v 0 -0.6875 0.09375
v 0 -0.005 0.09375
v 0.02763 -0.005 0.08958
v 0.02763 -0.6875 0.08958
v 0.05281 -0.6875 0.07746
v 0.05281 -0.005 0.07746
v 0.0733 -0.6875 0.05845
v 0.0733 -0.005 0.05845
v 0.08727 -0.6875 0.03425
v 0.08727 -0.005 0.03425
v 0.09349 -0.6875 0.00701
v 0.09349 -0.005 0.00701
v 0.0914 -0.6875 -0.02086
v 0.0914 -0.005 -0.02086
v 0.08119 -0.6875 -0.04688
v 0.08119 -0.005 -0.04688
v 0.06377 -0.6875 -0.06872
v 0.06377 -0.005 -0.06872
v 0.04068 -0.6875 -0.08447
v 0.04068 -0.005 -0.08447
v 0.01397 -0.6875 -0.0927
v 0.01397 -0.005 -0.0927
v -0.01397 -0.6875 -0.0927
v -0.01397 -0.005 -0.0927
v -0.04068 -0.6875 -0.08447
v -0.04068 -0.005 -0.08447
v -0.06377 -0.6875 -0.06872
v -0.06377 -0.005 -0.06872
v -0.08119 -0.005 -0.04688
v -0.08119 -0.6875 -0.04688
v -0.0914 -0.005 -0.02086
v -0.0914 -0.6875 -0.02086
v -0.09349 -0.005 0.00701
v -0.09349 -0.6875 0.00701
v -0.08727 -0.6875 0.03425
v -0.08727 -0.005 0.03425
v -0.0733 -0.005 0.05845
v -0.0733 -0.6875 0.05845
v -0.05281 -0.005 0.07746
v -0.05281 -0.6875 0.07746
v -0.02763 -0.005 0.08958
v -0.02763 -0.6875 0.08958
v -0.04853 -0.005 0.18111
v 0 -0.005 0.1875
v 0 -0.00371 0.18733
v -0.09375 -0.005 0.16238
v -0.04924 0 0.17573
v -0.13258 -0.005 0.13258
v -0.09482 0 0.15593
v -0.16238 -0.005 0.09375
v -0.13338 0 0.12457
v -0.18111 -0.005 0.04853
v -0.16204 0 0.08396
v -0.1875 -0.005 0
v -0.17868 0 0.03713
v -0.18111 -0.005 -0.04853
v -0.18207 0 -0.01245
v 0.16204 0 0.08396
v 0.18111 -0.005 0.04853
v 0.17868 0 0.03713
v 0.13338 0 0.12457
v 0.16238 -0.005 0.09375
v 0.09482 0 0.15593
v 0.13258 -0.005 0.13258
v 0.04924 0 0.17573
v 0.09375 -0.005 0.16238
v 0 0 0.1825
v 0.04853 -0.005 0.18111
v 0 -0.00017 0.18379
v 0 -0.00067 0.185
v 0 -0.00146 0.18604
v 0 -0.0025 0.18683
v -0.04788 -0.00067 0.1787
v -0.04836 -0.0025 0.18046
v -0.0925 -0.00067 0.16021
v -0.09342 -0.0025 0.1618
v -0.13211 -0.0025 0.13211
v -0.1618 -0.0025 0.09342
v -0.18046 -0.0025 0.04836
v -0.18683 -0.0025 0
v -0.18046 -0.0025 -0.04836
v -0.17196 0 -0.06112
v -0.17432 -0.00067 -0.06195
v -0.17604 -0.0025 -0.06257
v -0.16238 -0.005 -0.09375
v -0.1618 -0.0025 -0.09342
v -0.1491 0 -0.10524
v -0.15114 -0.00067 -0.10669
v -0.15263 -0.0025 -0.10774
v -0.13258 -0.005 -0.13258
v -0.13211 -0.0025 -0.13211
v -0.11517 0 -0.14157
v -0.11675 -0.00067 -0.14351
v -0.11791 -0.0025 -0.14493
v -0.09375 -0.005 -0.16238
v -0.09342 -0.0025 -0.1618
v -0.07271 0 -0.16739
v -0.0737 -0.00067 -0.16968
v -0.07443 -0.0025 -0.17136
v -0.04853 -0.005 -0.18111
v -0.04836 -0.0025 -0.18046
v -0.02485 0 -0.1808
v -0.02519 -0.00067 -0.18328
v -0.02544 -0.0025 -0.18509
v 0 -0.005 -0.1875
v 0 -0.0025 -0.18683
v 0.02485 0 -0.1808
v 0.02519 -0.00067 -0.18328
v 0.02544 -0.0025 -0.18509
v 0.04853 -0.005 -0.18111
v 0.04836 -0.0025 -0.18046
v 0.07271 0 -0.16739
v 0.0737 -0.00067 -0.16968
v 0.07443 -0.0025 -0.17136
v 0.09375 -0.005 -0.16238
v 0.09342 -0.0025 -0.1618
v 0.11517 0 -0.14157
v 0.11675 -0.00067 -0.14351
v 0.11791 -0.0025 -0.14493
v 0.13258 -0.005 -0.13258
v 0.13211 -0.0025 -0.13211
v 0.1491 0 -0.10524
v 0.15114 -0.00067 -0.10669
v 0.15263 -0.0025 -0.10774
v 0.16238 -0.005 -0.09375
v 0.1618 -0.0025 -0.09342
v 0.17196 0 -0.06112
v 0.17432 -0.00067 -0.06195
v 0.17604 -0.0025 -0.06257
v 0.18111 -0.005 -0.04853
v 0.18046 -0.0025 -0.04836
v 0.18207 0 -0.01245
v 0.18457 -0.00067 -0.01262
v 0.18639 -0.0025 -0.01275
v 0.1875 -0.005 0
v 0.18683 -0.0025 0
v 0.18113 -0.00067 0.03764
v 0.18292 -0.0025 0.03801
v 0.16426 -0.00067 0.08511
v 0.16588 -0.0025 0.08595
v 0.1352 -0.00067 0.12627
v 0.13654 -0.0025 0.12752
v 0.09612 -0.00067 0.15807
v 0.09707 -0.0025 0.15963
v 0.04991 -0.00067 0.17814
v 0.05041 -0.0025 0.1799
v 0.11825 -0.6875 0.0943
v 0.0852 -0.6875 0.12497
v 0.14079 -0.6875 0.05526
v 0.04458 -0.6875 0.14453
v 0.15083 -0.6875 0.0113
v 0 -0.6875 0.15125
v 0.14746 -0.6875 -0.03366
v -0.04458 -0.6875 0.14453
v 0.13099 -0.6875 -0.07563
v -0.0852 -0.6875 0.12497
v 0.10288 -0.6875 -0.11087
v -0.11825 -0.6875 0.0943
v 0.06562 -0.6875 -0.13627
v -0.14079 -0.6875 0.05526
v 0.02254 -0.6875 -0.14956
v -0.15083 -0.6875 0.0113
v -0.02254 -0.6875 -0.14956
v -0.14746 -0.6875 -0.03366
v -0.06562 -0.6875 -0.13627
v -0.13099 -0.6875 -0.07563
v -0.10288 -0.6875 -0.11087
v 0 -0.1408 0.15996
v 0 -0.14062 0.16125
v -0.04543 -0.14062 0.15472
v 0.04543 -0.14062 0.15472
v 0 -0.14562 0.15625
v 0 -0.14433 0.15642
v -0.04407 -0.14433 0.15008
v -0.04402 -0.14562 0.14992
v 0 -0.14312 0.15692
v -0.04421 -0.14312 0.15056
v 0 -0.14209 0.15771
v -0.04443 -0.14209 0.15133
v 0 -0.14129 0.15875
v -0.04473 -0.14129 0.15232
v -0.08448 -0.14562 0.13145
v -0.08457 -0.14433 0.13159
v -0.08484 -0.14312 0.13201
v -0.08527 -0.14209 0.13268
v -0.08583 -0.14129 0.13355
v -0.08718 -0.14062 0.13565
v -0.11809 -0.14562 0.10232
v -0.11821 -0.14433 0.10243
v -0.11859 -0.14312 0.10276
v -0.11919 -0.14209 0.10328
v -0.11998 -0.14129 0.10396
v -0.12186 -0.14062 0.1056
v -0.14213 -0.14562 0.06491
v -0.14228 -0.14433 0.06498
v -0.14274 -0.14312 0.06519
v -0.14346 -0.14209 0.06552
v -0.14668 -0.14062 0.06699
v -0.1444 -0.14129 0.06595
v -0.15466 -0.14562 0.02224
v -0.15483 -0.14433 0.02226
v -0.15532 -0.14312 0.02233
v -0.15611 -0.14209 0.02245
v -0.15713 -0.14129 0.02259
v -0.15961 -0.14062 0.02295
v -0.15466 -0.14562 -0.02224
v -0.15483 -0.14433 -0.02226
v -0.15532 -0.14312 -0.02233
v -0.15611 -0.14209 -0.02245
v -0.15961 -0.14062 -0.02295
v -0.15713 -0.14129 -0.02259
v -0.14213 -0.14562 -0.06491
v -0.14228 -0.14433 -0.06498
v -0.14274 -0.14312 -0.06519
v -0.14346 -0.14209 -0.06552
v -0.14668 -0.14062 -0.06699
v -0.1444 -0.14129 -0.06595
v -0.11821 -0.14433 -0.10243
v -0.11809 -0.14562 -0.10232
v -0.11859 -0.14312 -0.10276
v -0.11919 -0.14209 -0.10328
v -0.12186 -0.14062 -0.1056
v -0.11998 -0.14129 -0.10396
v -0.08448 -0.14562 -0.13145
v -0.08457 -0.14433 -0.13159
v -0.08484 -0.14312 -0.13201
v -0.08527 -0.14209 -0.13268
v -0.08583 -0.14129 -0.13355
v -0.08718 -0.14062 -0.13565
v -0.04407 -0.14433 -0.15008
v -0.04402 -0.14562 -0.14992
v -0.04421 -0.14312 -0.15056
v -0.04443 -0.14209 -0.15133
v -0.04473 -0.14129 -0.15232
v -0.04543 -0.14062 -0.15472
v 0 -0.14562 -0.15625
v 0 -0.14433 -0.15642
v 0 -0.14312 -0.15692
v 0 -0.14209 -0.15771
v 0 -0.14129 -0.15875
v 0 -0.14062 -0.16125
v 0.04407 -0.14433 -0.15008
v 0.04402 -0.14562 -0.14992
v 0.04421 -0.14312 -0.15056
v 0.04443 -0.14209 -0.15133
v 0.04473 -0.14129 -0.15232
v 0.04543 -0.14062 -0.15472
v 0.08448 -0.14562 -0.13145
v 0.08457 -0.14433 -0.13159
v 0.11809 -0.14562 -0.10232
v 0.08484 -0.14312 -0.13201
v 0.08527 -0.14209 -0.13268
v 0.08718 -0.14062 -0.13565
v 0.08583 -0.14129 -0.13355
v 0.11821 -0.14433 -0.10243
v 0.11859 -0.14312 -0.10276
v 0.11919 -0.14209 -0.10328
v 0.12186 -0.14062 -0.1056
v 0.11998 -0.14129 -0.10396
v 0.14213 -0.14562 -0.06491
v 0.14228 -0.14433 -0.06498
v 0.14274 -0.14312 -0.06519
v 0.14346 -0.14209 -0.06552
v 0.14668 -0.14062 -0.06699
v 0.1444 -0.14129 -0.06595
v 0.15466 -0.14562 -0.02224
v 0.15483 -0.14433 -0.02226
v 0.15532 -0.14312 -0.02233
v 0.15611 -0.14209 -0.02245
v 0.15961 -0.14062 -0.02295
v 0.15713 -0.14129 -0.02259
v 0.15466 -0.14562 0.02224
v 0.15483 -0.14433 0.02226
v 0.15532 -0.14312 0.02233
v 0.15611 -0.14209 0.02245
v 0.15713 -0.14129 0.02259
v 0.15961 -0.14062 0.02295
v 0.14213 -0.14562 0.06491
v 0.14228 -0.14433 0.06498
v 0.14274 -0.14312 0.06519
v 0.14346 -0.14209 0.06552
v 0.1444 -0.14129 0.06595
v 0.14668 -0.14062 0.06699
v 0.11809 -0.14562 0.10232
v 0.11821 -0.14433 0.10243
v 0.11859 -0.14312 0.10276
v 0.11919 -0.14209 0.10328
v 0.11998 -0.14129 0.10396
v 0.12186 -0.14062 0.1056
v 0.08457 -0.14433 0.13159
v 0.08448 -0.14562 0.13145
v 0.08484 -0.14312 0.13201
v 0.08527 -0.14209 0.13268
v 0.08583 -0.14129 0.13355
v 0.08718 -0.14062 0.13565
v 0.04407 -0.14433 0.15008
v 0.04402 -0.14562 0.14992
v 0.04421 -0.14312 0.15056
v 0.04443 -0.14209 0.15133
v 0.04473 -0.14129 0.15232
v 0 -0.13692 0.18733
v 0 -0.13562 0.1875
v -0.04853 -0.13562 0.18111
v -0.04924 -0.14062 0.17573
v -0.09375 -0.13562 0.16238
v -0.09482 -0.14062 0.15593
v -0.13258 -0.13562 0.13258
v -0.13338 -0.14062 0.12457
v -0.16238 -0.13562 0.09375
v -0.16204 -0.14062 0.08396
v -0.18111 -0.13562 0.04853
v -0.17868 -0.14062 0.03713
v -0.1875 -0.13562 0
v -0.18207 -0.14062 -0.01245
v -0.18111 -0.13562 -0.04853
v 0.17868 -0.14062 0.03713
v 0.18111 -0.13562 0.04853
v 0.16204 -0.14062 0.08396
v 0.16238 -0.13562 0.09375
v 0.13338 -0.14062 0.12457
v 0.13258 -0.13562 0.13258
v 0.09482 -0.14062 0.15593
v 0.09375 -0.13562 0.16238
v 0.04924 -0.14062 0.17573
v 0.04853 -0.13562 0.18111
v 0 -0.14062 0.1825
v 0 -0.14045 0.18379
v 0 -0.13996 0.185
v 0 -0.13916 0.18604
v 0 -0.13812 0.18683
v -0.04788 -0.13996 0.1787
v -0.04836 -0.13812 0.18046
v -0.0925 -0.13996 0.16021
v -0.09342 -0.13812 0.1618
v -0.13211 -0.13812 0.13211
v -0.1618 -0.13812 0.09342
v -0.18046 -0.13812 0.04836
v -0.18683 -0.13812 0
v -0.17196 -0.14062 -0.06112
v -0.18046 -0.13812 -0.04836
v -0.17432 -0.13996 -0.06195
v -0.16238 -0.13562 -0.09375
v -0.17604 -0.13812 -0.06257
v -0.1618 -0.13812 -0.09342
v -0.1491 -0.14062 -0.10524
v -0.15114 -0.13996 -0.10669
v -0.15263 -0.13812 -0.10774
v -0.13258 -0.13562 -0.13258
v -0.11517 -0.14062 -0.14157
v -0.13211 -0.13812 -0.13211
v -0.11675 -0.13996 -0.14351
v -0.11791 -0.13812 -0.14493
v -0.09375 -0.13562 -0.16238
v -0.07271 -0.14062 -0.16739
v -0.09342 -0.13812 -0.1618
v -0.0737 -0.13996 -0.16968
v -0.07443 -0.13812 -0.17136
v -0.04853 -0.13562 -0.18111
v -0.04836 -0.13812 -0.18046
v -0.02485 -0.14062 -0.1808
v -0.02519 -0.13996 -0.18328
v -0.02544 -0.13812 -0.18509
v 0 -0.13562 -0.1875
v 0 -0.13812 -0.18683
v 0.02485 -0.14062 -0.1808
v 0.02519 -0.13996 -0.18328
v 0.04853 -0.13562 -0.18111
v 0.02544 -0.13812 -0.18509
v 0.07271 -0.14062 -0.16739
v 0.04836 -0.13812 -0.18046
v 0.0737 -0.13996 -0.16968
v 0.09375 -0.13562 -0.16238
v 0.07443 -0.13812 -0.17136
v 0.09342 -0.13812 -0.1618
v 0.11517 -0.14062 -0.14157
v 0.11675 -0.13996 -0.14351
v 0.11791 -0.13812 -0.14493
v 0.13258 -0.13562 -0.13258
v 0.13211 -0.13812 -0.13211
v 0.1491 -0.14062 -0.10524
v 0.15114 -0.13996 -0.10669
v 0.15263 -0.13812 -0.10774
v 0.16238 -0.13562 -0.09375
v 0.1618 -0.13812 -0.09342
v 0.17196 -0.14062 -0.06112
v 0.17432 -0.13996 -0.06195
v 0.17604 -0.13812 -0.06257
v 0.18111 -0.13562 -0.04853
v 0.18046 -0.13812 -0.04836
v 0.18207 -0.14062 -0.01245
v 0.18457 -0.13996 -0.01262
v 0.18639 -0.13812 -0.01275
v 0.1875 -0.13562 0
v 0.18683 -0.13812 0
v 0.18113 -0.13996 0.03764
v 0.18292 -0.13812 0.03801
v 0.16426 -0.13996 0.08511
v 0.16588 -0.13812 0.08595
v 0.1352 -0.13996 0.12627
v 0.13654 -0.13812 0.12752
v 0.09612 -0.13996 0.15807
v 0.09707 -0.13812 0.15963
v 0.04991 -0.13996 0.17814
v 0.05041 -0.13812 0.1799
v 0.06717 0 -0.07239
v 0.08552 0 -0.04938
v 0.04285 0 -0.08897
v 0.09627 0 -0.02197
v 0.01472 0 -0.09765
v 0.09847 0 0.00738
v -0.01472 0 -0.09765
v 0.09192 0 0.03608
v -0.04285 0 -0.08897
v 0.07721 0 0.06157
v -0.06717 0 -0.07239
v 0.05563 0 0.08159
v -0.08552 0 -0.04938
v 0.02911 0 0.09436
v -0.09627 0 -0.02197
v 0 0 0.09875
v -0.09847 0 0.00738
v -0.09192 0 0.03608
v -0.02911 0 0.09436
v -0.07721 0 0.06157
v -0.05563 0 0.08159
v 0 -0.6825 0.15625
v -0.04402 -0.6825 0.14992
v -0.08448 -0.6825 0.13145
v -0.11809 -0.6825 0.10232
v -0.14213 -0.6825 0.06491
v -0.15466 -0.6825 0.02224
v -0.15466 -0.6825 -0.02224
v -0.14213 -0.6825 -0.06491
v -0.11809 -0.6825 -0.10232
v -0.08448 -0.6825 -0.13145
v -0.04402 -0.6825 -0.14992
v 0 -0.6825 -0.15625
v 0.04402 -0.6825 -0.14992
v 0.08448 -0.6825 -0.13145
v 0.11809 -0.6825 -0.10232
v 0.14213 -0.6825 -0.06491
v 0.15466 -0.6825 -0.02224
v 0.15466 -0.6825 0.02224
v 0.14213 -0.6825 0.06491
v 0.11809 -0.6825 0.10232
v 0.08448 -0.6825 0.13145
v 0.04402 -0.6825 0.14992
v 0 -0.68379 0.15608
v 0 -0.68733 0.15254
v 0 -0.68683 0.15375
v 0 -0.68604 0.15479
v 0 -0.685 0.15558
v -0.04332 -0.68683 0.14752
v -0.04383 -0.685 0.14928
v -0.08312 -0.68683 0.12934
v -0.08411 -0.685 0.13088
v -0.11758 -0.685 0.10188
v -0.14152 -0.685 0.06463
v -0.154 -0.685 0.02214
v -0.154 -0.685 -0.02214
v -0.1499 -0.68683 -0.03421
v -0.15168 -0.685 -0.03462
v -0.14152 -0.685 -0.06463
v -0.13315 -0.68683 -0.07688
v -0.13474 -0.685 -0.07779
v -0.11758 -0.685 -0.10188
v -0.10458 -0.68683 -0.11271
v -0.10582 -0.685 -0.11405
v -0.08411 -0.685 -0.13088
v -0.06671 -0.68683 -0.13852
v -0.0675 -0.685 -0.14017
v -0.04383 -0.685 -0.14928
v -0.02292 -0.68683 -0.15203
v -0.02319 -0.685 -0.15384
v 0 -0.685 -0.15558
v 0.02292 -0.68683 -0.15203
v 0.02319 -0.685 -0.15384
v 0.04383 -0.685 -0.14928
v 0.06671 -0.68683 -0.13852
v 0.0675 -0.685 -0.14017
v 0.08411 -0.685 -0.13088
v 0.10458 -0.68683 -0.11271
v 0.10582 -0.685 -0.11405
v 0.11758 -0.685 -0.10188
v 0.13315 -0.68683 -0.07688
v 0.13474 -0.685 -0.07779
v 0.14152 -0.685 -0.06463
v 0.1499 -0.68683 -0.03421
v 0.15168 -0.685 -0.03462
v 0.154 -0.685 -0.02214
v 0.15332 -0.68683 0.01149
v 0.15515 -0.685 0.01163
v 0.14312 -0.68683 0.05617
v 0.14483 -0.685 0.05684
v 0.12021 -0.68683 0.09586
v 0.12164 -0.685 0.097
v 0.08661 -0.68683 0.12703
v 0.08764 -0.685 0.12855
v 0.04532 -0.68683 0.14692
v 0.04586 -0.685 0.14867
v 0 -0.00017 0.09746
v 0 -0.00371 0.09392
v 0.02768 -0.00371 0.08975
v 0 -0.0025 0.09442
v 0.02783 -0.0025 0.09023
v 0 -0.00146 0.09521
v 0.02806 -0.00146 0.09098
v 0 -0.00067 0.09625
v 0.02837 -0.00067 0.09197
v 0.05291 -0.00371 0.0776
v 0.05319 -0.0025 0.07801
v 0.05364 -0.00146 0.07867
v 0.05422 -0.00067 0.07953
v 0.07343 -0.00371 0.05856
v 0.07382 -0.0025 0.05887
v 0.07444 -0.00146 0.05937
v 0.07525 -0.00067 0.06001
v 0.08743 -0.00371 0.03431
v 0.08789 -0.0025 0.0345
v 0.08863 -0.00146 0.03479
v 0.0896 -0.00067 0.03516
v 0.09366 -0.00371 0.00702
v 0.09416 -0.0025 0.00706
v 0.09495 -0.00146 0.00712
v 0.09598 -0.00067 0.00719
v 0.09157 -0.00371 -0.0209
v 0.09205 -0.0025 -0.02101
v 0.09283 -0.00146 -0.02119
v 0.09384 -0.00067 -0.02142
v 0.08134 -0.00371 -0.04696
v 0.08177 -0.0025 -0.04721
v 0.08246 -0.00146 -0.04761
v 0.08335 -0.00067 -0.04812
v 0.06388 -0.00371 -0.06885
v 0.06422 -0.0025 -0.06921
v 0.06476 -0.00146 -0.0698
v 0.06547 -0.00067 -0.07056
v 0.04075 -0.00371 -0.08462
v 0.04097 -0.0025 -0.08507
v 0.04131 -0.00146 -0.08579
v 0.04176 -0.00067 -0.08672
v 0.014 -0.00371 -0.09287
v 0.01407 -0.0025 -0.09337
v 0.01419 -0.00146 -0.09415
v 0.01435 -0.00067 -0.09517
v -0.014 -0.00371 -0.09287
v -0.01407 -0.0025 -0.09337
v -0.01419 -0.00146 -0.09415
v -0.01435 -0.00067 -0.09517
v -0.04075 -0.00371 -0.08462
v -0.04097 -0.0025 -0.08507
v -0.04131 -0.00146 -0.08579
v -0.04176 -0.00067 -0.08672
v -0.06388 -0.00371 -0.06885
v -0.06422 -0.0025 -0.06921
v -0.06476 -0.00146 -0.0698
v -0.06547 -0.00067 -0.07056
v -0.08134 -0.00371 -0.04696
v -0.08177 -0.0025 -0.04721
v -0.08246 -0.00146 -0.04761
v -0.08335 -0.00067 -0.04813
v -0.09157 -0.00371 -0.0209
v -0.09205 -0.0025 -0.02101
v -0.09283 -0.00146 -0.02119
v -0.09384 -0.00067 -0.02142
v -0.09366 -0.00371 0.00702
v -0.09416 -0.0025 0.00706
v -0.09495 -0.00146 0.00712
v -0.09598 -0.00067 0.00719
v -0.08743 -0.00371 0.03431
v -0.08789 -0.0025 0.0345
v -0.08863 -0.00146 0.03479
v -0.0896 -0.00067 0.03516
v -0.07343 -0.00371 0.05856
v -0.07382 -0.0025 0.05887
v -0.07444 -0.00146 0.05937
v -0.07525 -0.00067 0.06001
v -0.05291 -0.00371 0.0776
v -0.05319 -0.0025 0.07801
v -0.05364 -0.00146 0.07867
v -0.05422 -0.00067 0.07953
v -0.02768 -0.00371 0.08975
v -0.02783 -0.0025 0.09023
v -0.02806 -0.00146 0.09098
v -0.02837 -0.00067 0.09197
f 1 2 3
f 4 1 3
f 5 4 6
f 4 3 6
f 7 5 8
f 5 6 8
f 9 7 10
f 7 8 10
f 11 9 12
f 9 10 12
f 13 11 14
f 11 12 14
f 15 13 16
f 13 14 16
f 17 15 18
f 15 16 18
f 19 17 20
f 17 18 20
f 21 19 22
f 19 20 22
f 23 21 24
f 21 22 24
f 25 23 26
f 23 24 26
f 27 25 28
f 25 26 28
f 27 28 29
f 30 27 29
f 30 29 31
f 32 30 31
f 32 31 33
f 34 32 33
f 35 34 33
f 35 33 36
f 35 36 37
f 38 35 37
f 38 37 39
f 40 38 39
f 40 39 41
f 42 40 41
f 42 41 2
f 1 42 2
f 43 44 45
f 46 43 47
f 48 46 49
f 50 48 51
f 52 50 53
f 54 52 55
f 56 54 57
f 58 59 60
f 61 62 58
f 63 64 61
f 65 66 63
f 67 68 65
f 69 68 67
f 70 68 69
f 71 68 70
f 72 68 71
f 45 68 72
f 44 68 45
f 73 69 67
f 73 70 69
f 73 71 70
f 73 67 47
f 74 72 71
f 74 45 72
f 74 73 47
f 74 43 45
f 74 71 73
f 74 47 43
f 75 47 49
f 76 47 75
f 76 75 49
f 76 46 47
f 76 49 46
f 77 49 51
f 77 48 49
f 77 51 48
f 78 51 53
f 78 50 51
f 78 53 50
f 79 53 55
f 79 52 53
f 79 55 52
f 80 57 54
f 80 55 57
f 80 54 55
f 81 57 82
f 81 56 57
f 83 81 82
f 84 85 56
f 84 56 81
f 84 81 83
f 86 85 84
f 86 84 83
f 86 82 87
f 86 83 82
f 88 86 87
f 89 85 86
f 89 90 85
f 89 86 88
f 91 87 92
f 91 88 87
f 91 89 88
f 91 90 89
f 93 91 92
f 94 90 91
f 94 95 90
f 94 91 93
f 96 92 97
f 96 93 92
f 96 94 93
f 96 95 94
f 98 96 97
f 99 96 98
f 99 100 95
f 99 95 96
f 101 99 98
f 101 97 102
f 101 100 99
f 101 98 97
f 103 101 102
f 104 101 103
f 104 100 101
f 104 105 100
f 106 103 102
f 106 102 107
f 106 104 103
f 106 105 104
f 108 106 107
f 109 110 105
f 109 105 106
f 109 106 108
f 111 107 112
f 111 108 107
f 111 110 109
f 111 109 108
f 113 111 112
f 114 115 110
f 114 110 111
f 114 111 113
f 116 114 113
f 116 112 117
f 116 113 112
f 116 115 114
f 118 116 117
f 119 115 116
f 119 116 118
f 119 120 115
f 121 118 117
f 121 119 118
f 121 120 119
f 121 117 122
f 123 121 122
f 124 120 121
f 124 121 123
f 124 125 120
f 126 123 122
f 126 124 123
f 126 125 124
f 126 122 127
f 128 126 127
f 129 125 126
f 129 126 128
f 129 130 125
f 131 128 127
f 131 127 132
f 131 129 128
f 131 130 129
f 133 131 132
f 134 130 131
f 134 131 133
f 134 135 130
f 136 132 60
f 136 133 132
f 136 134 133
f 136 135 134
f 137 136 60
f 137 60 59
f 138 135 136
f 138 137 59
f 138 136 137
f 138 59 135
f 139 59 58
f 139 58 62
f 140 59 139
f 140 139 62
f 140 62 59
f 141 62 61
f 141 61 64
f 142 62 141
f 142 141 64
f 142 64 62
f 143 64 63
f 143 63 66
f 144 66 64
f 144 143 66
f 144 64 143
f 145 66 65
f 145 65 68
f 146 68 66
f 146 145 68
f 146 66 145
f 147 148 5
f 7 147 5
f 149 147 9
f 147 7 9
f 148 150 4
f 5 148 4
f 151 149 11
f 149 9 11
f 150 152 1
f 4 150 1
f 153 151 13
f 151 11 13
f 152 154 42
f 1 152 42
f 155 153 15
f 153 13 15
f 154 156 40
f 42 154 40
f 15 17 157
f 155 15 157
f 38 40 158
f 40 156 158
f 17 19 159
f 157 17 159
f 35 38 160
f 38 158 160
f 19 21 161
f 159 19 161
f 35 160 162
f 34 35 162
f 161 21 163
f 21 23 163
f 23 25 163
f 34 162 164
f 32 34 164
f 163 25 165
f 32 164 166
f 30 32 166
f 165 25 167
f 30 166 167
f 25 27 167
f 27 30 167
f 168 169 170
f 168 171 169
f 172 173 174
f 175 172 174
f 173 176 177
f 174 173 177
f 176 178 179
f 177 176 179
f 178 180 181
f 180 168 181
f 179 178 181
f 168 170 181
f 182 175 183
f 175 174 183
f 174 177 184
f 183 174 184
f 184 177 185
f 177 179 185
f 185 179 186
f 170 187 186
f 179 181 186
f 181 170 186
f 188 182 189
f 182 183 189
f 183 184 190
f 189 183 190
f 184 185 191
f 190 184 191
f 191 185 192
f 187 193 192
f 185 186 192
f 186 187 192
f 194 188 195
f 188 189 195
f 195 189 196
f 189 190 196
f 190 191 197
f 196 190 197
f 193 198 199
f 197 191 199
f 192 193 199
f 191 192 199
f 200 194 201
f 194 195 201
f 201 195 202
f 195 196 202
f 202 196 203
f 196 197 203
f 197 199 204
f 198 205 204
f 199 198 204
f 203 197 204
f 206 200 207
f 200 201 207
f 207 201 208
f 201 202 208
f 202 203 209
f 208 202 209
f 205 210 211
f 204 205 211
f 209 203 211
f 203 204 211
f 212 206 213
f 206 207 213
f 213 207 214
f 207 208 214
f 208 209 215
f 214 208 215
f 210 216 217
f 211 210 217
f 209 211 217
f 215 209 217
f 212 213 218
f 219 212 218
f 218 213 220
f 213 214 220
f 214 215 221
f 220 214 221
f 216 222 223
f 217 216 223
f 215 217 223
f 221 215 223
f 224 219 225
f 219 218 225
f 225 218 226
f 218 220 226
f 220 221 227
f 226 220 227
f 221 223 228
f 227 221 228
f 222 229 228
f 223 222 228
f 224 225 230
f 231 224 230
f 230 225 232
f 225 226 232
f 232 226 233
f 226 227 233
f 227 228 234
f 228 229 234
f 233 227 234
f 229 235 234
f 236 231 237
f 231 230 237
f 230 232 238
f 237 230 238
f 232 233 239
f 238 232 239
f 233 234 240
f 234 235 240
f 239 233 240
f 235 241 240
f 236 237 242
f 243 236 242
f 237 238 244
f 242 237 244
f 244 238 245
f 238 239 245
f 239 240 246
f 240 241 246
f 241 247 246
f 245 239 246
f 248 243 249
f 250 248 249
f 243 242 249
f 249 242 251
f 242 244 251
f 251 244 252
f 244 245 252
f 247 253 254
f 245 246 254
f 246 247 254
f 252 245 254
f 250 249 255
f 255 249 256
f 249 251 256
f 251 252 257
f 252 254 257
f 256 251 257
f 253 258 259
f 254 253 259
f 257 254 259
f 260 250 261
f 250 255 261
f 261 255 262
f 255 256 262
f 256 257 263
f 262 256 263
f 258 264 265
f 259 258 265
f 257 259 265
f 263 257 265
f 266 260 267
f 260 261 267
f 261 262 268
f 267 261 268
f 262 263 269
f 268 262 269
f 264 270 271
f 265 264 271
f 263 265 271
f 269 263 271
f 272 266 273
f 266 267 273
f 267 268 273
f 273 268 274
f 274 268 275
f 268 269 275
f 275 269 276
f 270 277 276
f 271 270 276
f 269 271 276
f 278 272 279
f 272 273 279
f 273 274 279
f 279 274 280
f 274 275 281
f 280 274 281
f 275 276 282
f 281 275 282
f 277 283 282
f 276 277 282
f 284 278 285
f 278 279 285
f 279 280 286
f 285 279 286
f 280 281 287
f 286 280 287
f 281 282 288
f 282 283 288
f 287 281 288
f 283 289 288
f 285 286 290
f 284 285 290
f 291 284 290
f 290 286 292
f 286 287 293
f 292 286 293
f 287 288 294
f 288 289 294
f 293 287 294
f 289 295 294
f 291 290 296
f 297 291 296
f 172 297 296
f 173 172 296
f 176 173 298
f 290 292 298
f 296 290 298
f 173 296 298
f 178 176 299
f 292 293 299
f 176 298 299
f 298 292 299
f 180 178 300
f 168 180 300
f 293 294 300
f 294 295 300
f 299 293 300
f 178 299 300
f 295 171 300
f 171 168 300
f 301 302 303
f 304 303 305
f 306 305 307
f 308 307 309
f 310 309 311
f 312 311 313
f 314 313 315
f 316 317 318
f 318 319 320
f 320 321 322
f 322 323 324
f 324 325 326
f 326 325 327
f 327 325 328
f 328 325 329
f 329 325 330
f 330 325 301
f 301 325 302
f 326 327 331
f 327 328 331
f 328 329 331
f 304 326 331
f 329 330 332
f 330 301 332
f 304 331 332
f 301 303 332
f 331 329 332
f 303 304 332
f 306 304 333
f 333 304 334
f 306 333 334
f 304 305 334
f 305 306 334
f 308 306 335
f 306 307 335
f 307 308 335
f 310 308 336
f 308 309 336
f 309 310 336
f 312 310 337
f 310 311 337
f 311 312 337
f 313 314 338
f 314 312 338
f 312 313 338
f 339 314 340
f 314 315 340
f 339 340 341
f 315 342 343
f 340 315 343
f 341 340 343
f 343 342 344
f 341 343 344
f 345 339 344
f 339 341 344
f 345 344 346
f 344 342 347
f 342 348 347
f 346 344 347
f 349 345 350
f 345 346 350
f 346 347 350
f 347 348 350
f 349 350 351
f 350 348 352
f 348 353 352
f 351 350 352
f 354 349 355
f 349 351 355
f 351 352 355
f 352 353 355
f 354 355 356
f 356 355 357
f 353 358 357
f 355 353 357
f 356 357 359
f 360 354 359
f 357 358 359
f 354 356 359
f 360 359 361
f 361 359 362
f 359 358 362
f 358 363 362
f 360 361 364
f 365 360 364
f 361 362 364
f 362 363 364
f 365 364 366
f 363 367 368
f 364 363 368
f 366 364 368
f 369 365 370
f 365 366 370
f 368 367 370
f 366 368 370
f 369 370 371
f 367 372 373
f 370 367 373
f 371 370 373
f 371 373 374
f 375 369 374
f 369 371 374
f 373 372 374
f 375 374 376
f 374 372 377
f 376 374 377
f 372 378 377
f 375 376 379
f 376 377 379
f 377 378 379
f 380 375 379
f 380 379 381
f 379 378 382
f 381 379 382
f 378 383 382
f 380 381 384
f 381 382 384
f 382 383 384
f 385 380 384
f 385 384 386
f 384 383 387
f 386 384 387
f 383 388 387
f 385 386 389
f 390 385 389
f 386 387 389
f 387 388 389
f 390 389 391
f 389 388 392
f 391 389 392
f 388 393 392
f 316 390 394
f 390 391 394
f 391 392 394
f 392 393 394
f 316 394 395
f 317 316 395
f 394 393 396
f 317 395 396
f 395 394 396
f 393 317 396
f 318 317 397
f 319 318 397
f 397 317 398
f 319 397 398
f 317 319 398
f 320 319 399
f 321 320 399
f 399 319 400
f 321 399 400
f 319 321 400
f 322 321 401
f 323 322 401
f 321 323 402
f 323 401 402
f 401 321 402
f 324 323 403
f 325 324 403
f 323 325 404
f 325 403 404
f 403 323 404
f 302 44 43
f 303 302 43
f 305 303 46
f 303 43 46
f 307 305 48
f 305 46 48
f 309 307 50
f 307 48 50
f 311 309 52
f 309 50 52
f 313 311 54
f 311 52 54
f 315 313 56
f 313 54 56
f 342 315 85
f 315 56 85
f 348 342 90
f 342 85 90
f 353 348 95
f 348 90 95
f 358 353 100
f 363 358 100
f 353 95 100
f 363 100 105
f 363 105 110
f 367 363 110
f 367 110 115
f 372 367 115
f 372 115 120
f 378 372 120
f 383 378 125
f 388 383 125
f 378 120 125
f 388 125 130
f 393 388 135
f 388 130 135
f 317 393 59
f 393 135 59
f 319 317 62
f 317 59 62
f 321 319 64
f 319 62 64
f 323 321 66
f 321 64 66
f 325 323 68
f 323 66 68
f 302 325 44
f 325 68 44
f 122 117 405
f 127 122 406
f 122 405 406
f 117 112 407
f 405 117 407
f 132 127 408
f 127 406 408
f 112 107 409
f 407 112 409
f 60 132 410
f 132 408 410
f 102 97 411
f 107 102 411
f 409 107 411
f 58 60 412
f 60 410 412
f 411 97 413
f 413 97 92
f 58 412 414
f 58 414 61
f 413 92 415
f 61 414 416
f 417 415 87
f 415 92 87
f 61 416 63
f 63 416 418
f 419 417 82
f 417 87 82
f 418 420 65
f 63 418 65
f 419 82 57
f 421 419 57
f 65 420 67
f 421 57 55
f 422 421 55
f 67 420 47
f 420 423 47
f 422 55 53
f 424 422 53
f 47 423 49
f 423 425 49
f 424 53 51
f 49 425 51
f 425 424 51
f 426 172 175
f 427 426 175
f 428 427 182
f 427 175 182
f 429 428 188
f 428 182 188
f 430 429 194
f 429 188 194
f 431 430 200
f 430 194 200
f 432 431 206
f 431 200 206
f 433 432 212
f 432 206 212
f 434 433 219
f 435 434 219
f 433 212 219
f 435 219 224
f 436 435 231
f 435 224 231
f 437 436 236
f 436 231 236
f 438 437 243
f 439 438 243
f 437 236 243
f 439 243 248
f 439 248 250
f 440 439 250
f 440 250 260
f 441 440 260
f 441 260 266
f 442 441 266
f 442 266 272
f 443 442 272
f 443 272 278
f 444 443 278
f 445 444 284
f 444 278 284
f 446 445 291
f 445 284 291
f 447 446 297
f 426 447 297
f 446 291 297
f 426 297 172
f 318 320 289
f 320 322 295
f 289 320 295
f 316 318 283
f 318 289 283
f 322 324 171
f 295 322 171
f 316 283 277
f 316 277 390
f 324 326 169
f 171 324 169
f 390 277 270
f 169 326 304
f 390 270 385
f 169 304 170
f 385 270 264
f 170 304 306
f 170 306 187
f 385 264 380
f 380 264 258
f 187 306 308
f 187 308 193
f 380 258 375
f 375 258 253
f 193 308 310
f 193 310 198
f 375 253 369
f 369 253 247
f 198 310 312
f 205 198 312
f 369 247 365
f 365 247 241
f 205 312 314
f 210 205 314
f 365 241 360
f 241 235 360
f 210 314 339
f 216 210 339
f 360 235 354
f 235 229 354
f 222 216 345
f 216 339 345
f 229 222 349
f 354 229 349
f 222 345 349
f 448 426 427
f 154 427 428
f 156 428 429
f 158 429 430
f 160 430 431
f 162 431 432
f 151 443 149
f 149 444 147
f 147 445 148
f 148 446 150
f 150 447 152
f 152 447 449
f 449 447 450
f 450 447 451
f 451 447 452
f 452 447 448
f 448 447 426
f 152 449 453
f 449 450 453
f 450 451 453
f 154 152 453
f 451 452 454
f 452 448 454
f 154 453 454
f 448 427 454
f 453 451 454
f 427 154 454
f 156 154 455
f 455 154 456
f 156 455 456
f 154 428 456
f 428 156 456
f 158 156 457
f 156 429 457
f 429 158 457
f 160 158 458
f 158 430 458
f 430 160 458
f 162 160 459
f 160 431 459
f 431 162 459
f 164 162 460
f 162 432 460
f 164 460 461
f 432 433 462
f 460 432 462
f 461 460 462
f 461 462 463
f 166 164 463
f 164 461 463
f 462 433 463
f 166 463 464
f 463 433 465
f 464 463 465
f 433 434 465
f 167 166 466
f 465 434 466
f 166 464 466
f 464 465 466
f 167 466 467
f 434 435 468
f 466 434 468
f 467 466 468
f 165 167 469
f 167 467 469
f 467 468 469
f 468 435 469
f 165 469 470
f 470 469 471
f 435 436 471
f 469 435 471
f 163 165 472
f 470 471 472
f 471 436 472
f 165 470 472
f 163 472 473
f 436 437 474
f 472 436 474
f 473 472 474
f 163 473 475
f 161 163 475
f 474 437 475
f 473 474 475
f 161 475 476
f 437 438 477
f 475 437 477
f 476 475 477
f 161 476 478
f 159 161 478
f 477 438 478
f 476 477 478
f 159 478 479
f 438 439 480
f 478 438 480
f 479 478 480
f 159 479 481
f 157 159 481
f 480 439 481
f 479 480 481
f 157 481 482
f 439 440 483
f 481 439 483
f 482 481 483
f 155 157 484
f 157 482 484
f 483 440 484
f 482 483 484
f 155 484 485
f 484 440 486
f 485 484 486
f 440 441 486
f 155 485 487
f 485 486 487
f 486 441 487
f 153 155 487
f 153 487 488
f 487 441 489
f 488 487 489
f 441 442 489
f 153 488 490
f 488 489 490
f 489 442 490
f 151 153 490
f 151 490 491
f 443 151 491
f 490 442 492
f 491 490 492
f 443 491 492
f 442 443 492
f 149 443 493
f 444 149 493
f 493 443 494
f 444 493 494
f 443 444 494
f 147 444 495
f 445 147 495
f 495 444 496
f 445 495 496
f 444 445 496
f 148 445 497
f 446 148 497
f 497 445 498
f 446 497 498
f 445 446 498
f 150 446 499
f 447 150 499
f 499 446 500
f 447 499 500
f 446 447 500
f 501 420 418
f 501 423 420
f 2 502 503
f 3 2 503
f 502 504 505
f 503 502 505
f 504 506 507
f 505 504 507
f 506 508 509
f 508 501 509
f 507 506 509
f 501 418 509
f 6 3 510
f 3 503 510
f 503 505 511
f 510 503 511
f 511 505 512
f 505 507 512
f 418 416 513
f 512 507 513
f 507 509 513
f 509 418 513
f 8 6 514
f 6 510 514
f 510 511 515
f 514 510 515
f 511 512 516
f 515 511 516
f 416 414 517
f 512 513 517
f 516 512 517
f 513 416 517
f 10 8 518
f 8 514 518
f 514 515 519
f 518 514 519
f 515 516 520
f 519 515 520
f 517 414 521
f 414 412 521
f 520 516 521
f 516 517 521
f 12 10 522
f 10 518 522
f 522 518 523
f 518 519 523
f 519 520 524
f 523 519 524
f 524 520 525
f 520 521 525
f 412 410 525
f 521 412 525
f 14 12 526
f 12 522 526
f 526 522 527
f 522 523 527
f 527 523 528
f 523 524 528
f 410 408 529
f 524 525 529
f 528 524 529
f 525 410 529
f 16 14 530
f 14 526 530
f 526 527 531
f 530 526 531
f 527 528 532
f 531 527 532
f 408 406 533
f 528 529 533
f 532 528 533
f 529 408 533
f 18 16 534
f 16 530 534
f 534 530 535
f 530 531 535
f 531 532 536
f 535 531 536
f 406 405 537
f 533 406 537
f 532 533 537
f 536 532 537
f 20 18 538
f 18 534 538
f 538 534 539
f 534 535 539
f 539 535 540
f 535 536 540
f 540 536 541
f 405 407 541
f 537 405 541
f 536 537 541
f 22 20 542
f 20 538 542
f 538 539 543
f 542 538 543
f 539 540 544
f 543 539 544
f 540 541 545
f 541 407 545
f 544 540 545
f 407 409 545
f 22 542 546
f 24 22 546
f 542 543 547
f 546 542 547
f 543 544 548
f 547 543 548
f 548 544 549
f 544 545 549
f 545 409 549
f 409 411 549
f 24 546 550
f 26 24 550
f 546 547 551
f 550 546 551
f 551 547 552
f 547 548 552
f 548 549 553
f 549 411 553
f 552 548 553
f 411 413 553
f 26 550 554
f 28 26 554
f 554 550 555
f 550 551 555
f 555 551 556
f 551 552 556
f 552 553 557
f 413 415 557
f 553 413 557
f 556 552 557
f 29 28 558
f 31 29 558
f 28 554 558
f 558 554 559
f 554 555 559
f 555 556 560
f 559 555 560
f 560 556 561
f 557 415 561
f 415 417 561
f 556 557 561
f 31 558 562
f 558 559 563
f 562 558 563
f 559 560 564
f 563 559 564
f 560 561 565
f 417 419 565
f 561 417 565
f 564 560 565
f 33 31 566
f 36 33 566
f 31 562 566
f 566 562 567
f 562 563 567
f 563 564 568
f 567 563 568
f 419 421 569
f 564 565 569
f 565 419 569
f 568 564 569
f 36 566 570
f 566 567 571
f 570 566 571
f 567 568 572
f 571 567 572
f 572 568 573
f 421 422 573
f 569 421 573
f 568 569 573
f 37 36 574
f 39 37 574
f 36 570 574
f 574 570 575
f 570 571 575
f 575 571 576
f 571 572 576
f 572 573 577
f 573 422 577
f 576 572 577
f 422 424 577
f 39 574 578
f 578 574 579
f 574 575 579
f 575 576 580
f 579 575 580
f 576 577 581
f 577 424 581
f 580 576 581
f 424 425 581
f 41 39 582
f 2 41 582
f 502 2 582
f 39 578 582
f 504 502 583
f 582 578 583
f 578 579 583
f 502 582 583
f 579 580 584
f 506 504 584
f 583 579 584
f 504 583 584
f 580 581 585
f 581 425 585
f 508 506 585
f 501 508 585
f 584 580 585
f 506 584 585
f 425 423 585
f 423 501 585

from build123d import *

# Parameters (mm, degrees)
SKETCH2_R          = 0.09375
CUT_EXTRUDE1_DEPTH = 1.736864133
FILLET1_R          = 0.005


with BuildPart() as part:
    # Sketch1 → Revolve1 (revolve)
    with BuildSketch(Plane.XY, mode=Mode.PRIVATE) as revolve1_sk:
        Polygon((0, -0.6875), (0.15625, -0.6875), (0.15625, -0.140625), (0.1875, -0.140625), (0.1875, 0), (0, 0), align=None)
    revolve(revolve1_sk.sketch.rotate(Axis((0, 0, 0), (0, -1, 0)), 90), axis=Axis((0, 0, 0), (0, -1, 0)))

    # Sketch2 → Cut-Extrude1 (cut, through all)
    with BuildSketch(Plane(origin=(0, 0, 0), x_dir=(1, 0, 0), z_dir=(0, 1, 0))):
        with Locations(Location((0, 0, 0), (0, 0, 270))):
            Circle(SKETCH2_R)
    extrude(amount=-CUT_EXTRUDE1_DEPTH, mode=Mode.SUBTRACT)

    # Fillet1
    fillet1_edges = [part.edges().sort_by_distance(p)[0] for p in [
        (0, 0, -0.09375),
        (0, 0, -0.1875),
        (0, -0.140625, -0.1875),
        (0, -0.140625, -0.15625),
        (0, -0.6875, -0.15625),
    ]]
    fillet(fillet1_edges, radius=FILLET1_R)


solid = part.part
